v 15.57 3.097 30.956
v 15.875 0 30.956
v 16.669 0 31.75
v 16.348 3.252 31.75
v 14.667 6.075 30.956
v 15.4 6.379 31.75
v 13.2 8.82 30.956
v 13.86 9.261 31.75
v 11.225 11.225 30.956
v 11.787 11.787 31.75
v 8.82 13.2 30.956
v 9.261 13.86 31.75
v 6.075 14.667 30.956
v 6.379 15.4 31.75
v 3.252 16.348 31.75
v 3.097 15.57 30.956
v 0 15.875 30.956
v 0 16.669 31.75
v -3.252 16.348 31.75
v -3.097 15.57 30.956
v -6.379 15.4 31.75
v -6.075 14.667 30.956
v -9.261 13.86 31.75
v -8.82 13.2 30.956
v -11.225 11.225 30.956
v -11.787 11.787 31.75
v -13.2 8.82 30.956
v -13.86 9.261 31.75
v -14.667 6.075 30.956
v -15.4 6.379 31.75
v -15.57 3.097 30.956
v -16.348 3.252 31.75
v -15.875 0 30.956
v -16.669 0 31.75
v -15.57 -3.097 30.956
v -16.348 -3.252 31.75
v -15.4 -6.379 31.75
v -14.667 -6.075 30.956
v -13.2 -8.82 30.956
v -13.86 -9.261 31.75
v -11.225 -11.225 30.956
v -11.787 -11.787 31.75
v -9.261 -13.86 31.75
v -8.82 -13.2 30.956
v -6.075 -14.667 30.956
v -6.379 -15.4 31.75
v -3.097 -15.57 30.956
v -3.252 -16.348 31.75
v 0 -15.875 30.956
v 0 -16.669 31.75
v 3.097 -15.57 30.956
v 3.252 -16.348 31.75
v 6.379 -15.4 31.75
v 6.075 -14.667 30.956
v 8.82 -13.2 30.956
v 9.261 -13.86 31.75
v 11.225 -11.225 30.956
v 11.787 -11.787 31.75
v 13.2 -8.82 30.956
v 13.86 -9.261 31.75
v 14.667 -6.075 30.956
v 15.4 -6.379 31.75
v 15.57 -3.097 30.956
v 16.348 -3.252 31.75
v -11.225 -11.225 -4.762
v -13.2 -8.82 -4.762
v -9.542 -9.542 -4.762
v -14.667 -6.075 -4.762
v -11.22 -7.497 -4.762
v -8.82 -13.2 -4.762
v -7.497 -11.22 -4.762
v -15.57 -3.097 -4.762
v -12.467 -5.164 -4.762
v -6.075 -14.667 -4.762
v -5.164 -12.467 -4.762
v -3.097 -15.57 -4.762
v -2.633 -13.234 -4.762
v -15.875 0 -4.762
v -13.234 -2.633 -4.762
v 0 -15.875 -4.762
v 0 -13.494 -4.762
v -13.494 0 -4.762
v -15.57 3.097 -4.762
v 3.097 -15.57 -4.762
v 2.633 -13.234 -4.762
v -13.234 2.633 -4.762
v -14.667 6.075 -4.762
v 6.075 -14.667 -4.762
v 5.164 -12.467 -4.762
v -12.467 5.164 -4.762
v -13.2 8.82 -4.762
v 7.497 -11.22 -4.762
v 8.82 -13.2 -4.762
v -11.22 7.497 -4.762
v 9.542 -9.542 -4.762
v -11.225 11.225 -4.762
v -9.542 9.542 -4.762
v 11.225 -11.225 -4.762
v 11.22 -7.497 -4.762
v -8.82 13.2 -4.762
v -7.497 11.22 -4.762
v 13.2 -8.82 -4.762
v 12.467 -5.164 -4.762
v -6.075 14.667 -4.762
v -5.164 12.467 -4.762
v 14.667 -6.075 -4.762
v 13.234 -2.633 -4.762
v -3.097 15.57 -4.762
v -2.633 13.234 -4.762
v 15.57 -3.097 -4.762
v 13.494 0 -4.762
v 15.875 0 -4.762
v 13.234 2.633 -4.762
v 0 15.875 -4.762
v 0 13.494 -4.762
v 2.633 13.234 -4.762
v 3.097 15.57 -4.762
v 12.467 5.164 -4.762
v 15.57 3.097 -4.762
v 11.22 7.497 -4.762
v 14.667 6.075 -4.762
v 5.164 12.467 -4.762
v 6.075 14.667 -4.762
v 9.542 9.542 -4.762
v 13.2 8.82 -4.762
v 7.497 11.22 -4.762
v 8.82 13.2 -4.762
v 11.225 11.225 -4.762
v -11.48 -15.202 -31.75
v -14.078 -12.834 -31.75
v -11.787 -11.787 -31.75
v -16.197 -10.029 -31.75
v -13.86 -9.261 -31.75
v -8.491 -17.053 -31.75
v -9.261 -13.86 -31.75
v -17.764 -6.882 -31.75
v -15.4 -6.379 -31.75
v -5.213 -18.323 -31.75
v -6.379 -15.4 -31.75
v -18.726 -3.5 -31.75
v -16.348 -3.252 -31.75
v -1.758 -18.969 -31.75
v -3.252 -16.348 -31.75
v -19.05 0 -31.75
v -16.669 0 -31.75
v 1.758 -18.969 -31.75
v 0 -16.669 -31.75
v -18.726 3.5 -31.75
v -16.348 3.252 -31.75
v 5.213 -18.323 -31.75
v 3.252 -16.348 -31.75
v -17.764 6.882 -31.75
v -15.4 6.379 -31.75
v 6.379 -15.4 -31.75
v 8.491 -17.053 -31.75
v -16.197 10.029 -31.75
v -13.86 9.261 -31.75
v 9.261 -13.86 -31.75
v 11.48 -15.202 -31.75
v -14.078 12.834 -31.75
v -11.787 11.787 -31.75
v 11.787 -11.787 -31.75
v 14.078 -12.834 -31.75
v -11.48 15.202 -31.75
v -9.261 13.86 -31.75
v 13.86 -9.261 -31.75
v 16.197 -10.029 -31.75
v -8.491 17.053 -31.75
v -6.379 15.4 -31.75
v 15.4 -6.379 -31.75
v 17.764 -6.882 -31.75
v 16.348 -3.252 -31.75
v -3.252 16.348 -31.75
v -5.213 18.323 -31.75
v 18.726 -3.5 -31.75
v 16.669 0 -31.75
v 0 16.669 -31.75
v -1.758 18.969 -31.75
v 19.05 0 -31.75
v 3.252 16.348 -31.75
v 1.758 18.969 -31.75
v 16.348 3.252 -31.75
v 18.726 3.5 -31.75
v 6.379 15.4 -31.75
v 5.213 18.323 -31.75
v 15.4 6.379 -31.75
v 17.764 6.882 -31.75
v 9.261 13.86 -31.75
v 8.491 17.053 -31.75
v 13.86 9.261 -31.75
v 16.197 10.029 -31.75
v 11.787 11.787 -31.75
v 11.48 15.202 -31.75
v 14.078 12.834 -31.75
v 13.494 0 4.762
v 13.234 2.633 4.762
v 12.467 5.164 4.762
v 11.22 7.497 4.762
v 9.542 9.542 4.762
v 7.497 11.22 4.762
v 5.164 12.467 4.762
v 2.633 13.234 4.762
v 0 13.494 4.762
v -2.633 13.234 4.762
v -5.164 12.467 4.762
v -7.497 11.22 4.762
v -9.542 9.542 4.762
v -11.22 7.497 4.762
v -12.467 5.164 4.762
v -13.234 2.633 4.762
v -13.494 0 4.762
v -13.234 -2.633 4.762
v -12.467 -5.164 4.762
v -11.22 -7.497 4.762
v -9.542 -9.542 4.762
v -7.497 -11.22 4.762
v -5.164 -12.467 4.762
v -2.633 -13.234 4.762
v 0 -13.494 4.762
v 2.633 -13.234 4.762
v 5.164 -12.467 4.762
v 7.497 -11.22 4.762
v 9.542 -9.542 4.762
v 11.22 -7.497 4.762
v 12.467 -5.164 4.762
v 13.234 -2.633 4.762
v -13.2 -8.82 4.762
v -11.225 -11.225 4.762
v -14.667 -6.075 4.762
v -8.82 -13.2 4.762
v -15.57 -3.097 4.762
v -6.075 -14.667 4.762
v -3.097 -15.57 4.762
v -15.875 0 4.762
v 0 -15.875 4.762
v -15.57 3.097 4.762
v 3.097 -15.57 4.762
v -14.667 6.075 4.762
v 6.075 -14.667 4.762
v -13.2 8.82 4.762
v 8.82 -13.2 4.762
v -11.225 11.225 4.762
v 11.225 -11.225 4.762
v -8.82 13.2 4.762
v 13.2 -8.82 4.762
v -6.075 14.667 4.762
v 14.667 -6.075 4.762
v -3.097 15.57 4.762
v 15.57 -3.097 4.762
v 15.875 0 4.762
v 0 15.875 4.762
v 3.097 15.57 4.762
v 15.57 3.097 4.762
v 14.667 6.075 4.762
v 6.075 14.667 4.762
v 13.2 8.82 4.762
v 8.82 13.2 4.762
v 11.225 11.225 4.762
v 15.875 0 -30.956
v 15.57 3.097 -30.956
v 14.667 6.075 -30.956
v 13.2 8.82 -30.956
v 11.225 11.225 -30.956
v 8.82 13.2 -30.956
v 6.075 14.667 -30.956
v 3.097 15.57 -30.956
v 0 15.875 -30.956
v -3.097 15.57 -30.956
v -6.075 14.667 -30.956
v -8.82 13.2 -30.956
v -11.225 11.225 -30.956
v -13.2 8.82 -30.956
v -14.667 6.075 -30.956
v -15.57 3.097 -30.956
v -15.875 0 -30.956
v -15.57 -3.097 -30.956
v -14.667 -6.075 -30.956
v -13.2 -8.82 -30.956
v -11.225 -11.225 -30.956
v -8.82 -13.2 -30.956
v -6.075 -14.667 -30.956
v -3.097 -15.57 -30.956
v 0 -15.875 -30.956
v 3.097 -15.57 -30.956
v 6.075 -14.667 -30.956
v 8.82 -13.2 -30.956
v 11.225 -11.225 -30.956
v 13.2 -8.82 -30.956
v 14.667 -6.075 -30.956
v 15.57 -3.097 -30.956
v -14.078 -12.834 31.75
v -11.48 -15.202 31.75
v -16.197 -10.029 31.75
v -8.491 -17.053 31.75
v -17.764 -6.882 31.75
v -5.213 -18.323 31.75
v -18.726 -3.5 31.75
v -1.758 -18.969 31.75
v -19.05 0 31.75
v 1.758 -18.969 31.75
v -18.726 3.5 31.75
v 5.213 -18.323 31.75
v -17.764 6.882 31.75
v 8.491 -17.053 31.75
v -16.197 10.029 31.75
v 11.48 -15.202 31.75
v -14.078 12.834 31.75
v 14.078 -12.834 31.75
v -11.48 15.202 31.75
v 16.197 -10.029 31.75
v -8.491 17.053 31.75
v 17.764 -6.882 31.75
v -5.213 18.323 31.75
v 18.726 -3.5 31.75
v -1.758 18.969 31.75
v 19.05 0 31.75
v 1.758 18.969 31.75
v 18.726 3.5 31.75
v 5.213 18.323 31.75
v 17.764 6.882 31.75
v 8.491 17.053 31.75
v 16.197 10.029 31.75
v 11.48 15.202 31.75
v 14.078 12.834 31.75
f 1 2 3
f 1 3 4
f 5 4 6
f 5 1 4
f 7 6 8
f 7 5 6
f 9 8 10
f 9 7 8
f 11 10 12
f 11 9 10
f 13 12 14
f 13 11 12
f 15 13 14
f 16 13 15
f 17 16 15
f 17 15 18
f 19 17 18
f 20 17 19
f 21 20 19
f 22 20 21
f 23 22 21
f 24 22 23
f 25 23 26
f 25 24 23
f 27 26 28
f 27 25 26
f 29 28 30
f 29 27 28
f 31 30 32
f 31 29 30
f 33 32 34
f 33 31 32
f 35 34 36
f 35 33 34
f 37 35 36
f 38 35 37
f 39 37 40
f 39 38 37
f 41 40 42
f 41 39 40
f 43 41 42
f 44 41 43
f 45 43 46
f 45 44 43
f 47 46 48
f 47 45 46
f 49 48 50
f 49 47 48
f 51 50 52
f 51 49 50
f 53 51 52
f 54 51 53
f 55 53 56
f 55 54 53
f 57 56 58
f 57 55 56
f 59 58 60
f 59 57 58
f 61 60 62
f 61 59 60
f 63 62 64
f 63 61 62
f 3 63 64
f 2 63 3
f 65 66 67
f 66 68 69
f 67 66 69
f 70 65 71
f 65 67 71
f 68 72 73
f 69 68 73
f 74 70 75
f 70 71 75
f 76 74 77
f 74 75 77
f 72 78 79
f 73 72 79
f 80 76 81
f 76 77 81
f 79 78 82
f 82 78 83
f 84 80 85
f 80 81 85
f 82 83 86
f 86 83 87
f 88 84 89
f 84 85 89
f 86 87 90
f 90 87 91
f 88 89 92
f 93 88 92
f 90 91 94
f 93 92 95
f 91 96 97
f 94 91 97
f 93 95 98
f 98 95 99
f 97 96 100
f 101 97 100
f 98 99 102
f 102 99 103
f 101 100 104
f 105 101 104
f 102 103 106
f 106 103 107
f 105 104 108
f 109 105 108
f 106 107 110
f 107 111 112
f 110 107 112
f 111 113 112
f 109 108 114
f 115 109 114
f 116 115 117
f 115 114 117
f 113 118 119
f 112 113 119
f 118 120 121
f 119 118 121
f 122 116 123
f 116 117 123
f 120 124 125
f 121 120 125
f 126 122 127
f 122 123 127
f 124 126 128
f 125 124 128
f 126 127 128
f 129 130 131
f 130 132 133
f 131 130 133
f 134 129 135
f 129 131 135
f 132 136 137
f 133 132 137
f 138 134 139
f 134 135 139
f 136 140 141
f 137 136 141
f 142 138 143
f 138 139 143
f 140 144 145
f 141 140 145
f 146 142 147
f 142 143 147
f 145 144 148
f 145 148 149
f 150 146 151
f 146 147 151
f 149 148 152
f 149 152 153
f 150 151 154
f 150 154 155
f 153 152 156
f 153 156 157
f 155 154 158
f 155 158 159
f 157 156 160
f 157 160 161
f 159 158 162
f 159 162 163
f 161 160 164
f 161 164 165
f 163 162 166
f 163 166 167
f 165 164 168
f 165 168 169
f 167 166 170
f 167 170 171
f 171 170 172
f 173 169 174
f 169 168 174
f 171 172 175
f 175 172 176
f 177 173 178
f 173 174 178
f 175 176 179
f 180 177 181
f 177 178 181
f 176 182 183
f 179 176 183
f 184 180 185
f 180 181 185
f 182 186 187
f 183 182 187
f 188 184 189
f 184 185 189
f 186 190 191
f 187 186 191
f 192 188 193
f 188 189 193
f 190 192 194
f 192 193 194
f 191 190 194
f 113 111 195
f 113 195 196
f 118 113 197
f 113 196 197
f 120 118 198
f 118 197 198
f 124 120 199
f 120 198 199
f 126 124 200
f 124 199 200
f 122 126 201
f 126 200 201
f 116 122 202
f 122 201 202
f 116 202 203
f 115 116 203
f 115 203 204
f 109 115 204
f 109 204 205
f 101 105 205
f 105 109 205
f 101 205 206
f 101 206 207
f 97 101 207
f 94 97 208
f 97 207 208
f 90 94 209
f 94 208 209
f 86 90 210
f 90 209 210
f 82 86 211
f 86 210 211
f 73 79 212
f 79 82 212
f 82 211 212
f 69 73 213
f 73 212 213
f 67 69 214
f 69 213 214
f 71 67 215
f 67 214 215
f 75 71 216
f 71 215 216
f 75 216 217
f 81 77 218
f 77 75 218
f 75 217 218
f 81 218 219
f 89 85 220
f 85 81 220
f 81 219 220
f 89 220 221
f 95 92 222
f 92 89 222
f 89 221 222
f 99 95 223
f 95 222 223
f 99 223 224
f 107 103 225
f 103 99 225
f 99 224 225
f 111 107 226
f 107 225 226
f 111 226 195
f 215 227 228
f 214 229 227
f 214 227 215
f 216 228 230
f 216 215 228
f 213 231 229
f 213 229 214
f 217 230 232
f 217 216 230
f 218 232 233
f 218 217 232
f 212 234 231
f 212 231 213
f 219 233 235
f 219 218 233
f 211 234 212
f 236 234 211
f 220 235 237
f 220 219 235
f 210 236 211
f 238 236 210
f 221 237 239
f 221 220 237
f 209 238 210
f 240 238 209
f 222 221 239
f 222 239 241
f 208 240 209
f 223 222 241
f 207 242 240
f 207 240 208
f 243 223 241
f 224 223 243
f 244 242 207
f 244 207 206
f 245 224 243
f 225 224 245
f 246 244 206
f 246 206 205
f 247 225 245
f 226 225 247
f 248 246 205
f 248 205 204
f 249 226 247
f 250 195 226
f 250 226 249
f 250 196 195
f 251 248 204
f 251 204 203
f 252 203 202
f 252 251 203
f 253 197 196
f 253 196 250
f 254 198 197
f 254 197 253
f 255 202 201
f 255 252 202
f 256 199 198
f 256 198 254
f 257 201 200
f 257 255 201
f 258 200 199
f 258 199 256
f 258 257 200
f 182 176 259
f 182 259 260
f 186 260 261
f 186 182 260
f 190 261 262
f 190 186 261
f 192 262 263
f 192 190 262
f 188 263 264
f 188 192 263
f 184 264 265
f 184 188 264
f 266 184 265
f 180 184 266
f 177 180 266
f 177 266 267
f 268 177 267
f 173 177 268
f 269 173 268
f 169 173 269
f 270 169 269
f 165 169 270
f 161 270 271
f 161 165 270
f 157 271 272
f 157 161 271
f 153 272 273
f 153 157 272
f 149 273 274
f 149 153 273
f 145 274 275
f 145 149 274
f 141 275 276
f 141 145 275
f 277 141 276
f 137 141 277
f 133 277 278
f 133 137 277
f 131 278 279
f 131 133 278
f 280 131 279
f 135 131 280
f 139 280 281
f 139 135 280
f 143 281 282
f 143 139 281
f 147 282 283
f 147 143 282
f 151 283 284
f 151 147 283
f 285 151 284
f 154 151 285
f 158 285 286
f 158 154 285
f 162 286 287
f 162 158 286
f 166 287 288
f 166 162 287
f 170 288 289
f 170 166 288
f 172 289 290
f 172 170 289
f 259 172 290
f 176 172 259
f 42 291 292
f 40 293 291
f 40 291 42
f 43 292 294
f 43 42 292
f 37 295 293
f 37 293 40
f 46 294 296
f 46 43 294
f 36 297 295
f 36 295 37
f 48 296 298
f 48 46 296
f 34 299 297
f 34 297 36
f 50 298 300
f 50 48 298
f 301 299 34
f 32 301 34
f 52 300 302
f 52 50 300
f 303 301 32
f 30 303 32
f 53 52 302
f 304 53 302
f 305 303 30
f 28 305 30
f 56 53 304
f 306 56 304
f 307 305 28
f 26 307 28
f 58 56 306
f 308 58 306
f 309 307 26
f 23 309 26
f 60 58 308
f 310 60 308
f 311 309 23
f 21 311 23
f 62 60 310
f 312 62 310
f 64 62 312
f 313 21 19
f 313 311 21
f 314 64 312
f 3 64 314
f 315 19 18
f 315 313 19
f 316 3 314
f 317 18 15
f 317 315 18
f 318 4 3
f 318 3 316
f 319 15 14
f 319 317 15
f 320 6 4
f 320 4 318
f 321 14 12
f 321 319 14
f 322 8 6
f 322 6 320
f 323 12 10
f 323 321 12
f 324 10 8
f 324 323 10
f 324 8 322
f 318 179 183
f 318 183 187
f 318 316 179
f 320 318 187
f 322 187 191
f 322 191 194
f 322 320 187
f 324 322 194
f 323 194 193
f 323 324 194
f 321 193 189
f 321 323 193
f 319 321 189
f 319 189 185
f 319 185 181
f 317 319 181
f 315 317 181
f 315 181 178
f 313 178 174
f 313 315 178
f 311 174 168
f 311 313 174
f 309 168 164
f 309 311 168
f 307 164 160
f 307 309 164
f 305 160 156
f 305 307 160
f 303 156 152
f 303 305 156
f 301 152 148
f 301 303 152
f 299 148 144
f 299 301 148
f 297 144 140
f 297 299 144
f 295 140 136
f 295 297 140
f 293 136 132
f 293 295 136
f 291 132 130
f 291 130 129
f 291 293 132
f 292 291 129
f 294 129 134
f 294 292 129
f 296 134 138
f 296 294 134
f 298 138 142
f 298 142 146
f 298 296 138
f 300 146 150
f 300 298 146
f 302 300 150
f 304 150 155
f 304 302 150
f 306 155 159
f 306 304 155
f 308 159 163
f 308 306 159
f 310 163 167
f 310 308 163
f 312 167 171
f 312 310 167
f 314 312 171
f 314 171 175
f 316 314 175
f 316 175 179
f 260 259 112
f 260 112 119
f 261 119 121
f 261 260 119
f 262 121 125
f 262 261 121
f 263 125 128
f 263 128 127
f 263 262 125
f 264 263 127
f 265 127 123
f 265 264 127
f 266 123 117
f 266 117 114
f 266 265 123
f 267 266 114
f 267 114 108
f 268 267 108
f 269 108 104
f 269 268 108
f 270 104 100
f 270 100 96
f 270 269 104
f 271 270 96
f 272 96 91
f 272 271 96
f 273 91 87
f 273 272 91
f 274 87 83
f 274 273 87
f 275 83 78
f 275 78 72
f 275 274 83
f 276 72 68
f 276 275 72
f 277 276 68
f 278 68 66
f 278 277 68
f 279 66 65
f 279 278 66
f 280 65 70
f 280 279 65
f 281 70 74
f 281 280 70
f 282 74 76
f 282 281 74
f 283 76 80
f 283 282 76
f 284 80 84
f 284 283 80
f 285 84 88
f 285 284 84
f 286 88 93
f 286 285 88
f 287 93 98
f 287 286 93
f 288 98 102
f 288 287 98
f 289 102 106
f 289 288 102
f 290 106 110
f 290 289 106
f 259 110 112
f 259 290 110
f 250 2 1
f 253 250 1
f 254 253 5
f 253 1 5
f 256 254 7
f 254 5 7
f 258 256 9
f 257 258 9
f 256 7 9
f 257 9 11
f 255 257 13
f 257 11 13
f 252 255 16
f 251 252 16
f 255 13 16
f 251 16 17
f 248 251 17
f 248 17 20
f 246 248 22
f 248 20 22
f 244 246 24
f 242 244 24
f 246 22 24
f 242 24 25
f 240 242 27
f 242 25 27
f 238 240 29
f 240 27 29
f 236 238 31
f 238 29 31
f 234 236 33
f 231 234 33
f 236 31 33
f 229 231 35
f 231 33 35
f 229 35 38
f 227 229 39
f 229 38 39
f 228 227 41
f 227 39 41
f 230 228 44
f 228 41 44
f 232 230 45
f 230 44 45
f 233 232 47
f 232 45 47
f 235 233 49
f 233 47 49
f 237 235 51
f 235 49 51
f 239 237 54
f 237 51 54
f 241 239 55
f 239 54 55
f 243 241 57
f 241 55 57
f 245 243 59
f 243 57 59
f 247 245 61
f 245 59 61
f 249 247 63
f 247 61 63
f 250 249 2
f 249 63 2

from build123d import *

# Parameters (mm, degrees)
SKETCH1_R           = 19.05
SKETCH1_R_2         = 13.49375
BOSS_EXTRUDE1_DEPTH = 31.75
SKETCH2_R           = 15.875
CUT_EXTRUDE1_DEPTH  = 26.9875
CHAMFER1_SIZE       = 0.79375


with BuildPart() as part:
    # Sketch1 → Boss-Extrude1 (new body)
    with BuildSketch(Plane.XY):
        Circle(SKETCH1_R)
        Circle(SKETCH1_R_2, mode=Mode.SUBTRACT)
    extrude(amount=BOSS_EXTRUDE1_DEPTH)

    # Sketch2 → Cut-Extrude1 (cut)
    with BuildSketch(Plane.XY.offset(31.75)):
        Circle(SKETCH2_R)
    extrude(amount=-CUT_EXTRUDE1_DEPTH, mode=Mode.SUBTRACT)

    # Mirror1: part across plane


with BuildPart() as part_1:
    add(part.part)
    add(part.part.mirror(Plane.XY))

    # Chamfer1
    chamfer1_edges = [part_1.edges().sort_by_distance(p)[0] for p in [
        (-15.875, 0, 31.75),
        (-15.875, 0, -31.75),
    ]]
    chamfer(chamfer1_edges, length=CHAMFER1_SIZE)


solid = part_1.part
